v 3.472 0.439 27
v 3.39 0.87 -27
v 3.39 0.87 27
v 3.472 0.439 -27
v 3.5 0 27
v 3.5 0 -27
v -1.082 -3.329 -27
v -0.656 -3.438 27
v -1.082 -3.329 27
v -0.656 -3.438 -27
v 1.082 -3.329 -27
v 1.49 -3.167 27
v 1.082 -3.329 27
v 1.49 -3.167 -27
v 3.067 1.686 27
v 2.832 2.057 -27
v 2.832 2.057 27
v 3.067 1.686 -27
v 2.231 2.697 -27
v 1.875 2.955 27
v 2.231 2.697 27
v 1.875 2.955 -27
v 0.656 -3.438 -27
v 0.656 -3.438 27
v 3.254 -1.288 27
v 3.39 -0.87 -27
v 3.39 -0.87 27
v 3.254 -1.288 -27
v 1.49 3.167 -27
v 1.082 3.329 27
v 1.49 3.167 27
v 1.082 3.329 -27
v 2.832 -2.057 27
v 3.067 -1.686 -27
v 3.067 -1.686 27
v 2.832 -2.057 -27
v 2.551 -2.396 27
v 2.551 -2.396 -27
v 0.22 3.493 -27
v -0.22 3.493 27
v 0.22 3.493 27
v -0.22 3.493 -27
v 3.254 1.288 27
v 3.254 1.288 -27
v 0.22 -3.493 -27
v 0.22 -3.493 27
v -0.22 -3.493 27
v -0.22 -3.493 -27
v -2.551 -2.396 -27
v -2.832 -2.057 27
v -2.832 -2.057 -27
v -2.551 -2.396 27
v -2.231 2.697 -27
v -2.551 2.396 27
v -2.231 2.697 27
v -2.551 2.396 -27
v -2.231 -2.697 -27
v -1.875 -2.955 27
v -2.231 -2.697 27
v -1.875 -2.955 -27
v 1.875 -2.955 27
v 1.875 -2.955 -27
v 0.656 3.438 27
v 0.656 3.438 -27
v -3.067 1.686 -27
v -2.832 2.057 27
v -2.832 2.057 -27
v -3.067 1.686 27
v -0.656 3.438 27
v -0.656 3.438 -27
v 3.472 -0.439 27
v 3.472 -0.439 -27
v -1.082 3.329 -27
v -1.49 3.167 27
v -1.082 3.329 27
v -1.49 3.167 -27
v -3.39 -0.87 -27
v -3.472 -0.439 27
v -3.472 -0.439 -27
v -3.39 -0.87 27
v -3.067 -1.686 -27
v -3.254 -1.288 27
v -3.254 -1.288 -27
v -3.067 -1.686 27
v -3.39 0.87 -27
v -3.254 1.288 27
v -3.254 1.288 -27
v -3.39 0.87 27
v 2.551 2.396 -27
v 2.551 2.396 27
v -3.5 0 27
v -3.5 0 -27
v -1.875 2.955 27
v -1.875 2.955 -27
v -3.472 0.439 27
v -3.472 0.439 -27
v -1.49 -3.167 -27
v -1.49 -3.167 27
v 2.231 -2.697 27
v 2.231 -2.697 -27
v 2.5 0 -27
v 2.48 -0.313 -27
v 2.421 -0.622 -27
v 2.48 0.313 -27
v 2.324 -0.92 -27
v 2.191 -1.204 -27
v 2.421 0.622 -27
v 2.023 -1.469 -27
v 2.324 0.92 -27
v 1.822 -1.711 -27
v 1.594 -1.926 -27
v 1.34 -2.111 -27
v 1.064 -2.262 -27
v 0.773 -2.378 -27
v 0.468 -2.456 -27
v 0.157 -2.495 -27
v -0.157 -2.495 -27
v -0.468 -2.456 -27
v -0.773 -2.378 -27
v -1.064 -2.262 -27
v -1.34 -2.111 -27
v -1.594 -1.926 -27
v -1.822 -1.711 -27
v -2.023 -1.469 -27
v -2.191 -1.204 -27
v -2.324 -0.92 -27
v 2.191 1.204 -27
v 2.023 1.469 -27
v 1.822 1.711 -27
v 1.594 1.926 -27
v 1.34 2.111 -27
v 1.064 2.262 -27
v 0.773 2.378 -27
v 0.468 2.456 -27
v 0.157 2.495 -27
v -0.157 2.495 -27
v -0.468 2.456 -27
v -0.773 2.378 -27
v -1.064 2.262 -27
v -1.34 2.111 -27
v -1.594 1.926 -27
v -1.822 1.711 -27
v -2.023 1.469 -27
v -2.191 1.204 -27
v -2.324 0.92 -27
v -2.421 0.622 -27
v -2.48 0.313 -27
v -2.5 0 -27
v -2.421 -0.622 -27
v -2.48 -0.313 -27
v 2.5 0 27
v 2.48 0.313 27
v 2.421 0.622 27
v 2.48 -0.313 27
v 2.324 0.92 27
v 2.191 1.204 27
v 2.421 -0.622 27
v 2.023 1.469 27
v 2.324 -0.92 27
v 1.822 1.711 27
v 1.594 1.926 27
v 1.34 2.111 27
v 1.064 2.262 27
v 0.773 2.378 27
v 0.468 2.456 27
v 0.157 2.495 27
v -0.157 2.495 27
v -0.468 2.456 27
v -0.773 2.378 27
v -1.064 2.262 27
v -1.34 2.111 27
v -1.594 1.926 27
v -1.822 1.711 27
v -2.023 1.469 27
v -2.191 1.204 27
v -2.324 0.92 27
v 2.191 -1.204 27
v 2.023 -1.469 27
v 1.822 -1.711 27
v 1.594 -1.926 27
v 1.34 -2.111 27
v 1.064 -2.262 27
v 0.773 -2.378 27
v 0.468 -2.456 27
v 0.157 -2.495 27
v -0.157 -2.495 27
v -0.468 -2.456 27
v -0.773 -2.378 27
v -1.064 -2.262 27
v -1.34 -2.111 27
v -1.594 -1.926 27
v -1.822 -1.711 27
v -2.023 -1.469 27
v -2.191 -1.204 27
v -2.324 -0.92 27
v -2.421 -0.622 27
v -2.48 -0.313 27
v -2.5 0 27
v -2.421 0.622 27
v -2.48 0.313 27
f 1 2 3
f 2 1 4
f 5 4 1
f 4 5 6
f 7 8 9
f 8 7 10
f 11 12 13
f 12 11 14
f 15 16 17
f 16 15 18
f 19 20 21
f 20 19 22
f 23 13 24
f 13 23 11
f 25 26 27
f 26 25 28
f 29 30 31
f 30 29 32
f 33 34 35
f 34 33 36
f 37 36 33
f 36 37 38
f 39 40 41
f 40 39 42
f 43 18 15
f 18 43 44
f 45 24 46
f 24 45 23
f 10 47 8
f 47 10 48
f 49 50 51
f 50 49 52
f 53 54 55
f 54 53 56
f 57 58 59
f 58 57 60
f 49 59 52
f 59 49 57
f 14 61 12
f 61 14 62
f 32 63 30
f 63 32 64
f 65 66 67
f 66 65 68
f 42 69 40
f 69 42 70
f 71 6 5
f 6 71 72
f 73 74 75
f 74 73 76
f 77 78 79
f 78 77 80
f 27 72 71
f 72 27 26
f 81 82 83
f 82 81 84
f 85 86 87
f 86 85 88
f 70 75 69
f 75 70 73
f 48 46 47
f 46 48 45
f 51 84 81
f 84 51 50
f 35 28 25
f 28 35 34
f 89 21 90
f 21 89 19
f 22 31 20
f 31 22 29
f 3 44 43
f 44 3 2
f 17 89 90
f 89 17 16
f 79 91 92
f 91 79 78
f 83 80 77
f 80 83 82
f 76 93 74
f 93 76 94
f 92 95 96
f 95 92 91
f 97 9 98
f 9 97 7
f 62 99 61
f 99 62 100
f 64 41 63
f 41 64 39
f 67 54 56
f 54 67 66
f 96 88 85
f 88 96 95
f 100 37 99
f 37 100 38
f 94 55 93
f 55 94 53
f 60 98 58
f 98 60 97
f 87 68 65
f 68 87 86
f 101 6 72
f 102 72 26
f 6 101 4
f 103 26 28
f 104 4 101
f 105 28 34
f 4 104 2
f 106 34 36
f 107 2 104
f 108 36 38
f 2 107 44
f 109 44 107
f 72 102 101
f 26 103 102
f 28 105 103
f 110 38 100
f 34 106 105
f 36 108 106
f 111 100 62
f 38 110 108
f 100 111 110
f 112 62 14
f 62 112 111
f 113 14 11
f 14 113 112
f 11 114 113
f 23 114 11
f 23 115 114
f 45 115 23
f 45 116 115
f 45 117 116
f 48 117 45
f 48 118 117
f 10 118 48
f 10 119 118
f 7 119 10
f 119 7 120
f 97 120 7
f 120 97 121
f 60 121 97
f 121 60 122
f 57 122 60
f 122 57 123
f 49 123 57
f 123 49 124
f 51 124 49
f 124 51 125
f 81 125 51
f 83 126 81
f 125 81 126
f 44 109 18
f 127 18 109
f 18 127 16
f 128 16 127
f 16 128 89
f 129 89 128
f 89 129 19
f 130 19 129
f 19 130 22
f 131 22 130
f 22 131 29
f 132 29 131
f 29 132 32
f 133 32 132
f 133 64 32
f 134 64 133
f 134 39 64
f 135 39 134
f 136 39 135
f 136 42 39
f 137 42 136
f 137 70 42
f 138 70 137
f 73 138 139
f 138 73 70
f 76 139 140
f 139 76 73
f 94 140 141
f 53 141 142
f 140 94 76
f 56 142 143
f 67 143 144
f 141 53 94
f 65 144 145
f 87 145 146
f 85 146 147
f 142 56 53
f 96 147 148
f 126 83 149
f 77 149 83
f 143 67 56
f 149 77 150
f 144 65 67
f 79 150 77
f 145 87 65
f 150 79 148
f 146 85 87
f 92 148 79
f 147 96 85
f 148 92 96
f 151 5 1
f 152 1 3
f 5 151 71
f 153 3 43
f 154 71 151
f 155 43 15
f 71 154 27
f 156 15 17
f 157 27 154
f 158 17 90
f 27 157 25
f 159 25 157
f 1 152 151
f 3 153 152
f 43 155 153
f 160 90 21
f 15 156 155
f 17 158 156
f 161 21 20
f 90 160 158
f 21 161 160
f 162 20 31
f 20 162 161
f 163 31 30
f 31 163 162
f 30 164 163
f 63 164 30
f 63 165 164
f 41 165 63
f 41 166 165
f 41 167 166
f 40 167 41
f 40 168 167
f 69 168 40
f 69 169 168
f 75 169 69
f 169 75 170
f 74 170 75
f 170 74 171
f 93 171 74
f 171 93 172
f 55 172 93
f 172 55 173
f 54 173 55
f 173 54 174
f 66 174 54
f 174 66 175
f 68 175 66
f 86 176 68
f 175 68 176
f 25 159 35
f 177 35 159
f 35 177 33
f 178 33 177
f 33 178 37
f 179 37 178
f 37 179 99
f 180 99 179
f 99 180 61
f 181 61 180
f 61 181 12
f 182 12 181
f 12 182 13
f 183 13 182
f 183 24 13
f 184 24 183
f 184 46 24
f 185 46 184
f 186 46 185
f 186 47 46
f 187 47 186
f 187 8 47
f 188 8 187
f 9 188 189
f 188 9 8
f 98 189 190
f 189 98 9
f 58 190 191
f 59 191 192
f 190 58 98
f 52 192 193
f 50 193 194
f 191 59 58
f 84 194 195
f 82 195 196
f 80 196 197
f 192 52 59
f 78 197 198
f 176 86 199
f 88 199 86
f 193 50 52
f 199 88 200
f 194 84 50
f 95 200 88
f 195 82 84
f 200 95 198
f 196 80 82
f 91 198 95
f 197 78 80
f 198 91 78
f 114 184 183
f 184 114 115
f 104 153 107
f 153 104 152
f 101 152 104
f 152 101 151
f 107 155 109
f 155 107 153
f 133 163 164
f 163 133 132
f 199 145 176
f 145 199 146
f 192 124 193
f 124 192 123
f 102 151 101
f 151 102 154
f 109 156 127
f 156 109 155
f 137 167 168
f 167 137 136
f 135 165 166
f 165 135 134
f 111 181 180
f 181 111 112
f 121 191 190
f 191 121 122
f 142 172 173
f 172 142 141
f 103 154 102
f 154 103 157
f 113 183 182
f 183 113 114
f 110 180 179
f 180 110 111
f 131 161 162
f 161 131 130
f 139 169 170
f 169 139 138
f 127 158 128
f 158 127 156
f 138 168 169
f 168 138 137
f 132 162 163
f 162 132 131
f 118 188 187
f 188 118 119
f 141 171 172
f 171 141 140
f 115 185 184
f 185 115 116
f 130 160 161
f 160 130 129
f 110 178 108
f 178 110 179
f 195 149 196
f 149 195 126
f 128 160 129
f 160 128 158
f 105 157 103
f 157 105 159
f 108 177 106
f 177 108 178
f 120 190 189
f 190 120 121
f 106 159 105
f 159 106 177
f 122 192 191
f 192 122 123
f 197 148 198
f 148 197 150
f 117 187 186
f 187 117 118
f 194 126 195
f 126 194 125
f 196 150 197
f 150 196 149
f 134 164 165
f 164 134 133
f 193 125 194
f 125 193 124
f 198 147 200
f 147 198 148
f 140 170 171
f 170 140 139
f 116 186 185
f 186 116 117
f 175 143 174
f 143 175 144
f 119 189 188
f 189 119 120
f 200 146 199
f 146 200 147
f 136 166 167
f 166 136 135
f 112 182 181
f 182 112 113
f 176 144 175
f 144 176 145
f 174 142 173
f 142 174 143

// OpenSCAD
$fn = 50;


difference() {
	union() {
		translate(v = [0, 0, -27.0000000000]) {
			cylinder(h = 54, r = 3.5000000000);
		}
	}
	union() {
		translate(v = [0, 0, -100.0000000000]) {
			cylinder(h = 200, r = 2.5000000000);
		}
	}
}
